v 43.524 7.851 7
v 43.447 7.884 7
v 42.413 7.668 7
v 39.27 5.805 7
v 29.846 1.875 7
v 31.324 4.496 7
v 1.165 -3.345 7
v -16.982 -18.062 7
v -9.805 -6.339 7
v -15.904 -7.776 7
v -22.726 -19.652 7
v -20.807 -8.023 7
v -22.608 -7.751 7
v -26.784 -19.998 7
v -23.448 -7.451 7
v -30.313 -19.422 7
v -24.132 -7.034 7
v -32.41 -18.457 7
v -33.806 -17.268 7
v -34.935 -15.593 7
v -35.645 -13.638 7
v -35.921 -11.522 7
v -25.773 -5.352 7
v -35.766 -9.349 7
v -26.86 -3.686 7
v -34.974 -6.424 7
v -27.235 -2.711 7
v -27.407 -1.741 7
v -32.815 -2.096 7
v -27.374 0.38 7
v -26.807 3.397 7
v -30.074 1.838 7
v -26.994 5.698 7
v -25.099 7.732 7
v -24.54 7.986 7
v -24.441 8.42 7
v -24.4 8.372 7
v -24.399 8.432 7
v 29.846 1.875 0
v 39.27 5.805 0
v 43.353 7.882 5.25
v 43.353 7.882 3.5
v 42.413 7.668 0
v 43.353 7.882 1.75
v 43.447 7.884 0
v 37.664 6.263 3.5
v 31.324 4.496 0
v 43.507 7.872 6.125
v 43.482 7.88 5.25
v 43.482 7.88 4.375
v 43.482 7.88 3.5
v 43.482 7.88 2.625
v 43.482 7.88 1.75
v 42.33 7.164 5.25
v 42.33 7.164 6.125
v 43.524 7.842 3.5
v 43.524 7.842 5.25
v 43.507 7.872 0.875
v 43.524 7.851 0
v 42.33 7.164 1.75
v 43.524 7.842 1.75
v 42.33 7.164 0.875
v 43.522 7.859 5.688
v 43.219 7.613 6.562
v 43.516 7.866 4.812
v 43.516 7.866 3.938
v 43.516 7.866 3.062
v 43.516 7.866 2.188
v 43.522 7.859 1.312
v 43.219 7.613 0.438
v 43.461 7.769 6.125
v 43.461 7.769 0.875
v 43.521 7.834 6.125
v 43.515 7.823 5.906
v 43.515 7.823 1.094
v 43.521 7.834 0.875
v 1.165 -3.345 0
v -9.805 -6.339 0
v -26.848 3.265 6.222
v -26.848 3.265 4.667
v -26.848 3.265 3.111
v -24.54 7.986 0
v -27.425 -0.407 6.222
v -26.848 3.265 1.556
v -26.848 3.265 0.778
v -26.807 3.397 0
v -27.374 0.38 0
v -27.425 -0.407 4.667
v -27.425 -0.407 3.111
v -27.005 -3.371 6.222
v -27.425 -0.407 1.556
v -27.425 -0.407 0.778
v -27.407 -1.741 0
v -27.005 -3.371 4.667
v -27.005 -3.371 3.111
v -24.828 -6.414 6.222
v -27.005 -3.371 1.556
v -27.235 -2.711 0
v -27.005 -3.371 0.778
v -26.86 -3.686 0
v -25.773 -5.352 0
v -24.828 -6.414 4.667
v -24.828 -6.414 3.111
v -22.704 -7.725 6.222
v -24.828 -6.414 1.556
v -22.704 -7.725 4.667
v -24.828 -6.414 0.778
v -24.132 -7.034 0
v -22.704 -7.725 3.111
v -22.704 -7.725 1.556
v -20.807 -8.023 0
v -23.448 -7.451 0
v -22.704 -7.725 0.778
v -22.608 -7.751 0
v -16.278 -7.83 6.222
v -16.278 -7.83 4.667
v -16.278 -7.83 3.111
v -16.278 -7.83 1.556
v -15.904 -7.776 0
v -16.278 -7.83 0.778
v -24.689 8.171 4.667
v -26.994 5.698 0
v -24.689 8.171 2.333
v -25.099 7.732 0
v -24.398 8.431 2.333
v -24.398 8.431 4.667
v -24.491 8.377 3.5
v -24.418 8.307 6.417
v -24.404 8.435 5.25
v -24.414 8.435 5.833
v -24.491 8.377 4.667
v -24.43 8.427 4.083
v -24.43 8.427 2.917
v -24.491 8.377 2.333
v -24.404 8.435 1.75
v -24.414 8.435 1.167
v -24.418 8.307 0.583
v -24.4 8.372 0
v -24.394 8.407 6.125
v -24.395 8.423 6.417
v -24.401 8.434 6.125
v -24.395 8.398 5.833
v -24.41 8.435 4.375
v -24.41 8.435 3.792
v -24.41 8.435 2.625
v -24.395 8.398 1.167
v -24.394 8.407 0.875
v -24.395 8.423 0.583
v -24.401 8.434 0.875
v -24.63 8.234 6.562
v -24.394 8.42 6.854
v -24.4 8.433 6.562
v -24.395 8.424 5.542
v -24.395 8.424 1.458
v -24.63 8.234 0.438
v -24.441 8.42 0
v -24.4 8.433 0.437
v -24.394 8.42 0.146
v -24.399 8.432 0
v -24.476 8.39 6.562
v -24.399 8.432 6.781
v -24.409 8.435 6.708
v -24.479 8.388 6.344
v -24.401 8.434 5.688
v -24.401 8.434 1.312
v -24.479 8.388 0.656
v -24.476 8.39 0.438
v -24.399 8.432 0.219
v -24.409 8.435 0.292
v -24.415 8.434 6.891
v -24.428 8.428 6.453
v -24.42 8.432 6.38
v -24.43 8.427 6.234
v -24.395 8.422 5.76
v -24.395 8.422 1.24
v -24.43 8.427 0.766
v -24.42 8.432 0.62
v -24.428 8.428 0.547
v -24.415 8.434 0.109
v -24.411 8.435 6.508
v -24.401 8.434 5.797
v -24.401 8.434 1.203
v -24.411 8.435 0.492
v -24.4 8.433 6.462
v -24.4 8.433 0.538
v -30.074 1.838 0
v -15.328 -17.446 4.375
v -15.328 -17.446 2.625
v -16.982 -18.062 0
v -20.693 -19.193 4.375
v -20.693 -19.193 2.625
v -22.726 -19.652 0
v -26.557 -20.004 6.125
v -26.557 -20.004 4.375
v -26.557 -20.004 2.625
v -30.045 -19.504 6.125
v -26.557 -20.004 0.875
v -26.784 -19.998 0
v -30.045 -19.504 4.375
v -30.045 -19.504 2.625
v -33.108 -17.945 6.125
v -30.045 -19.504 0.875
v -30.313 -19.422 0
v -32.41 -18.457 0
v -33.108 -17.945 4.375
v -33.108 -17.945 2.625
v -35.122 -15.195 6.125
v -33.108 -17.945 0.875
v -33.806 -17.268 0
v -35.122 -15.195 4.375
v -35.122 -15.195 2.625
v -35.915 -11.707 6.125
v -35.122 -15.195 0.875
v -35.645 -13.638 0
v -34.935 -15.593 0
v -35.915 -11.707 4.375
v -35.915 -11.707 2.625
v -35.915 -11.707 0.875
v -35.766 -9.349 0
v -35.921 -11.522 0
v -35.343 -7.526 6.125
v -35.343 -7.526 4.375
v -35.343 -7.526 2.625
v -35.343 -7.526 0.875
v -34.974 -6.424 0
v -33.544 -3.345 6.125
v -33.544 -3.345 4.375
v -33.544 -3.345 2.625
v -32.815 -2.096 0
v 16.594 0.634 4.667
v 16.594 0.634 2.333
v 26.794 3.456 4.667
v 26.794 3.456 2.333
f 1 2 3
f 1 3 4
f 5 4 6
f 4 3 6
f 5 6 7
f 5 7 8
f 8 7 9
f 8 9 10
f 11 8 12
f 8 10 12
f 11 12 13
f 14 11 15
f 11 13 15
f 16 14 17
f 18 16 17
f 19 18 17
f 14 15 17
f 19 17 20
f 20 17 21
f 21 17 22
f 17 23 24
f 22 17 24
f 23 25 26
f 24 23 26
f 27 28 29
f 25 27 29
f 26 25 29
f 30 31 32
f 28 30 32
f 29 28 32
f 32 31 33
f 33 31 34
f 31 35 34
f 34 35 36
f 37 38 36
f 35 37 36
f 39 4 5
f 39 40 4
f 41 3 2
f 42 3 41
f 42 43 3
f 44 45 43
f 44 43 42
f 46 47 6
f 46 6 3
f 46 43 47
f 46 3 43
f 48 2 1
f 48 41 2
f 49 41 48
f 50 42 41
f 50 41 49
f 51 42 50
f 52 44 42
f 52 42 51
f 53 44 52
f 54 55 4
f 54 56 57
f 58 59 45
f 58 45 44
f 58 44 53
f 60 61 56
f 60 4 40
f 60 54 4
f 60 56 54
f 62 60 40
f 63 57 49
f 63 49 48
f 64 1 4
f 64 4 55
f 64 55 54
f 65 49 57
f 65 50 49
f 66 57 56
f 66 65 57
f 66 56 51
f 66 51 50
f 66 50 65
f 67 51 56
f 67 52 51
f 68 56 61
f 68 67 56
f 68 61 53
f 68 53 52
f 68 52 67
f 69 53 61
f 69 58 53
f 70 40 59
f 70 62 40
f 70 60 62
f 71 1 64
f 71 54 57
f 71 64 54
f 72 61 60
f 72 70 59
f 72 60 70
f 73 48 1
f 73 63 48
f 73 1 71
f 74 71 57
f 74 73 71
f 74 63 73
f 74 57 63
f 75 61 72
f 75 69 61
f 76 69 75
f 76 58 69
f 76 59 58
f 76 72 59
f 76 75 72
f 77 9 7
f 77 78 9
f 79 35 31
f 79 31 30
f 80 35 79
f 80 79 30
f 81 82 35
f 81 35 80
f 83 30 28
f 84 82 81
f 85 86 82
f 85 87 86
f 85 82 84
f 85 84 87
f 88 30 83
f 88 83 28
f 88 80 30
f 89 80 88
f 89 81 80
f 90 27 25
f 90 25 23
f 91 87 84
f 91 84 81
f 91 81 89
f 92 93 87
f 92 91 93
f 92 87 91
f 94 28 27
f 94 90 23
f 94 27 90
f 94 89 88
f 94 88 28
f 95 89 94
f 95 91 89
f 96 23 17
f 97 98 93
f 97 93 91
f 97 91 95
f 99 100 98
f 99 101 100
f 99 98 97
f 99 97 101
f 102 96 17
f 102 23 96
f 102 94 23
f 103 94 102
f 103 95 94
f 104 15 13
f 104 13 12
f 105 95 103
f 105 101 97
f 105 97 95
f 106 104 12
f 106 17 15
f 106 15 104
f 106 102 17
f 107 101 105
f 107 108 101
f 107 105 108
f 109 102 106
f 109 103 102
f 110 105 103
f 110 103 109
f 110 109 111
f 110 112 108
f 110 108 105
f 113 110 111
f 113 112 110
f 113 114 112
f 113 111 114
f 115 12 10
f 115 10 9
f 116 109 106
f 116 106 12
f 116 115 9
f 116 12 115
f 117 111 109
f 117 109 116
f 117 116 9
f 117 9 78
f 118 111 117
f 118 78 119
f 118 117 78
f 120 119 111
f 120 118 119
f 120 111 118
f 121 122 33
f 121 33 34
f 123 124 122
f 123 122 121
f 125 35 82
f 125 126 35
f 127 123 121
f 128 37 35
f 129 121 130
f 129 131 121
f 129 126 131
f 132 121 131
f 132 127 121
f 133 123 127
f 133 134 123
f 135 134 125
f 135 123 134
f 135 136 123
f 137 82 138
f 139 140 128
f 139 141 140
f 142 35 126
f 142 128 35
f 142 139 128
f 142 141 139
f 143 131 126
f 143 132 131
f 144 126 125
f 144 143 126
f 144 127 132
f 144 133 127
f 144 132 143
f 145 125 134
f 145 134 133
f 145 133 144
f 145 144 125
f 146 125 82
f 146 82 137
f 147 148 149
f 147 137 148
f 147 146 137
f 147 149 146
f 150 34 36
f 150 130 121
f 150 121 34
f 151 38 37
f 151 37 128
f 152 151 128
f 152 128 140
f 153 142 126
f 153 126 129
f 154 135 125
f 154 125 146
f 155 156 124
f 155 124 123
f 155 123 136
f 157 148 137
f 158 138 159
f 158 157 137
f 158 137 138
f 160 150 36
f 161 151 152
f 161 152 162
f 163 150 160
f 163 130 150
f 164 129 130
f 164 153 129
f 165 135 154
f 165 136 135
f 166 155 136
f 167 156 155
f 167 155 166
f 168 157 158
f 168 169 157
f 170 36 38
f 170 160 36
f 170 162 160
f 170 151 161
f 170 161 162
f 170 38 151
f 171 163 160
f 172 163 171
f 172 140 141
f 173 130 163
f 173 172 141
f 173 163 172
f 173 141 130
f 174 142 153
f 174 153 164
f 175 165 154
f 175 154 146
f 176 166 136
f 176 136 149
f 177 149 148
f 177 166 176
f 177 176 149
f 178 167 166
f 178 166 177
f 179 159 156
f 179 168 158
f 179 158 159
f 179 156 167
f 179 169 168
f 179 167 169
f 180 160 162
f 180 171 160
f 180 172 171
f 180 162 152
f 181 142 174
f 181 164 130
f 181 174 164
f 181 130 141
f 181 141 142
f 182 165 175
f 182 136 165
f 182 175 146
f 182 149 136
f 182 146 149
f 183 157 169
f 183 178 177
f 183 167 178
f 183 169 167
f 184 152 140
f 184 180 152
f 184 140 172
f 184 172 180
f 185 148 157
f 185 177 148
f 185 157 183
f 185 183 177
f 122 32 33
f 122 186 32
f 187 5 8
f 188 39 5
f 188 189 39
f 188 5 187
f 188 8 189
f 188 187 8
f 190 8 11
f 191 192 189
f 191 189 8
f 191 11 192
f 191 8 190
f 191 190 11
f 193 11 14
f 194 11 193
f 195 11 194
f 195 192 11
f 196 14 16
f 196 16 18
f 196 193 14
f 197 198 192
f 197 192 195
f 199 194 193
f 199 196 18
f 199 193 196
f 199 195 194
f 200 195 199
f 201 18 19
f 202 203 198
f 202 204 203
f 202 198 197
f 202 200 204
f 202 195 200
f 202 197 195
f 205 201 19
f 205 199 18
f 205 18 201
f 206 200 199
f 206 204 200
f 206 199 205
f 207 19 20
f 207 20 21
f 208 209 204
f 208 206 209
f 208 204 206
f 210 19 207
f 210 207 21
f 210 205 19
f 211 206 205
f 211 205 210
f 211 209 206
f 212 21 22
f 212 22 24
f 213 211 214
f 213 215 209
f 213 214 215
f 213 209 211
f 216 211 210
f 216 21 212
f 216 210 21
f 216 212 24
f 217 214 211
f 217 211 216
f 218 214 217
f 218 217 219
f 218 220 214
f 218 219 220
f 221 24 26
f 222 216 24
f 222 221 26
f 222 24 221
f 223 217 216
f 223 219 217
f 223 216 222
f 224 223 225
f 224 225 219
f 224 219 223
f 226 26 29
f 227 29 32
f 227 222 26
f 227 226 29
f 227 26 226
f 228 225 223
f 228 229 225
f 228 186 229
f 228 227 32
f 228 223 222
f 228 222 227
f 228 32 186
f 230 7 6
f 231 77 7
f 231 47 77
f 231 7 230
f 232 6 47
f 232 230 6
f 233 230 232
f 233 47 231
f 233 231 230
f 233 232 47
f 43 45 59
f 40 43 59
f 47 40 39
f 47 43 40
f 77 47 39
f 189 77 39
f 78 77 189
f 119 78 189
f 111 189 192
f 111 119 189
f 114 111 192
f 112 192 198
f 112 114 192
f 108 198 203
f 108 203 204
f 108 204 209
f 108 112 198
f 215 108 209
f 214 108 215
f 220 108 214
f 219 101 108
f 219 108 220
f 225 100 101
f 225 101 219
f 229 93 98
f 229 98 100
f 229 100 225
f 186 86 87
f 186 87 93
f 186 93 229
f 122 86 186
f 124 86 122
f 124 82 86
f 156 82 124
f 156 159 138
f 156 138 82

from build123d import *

# Parameters (mm, degrees)
F1_DEPTH = 7


with BuildPart() as f1:
    # F0 (on Top) → F1 (new body)
    with BuildSketch(Plane.XY):
        with BuildLine():
            add(Edge.make_bspline(
                [(-24.5399442118, 7.9858221547), (-24.881287558, 7.4063630489), (-25.6391011145, 6.1199106522), (-27.0473109199, 3.2964412095), (-27.5264046021, -0.4194481869), (-27.366247024, -3.4340737524), (-24.8624006016, -6.5646634632), (-22.7421111359, -8.1179139399), (-15.8276652271, -8.2175880232), (-7.2515312987, -5.5169695186), (-1.6106799233, -4.0612830315), (1.1645006399, -3.345115812)],
                knots=[0, 0, 0, 0, 0.0767905302, 0.1704820247, 0.2722923582, 0.3636560745, 0.4657956059, 0.5492354102, 0.6831079087, 0.8440957377, 1, 1, 1, 1], degree=3))
            add(Edge.make_bspline(
                [(-26.9939754706, 5.6983039216), (-26.0780812147, 6.681358633), (-24.8507912945, 7.9986429487), (-24.2992644125, 8.5883270318), (-24.4573579835, 8.1925640811), (-24.5399442118, 7.9858221547)],
                knots=[0, 0, 0, 0, 0.5841612292, 0.7827707005, 1, 1, 1, 1], degree=3))
            add(Edge.make_bspline(
                [(29.8455204267, 1.8753216104), (19.3854444544, -2.568447157), (1.3768280776, -10.219072947), (-14.8236830034, -17.4331393662), (-20.5349523375, -19.2496609389), (-26.5330850358, -20.478136543), (-33.8734034621, -18.8431389132), (-36.8983915675, -11.4999952957), (-33.9567302154, -2.8455304384), (-29.4097303562, 2.7339873036), (-26.9939754706, 5.6983039216)],
                knots=[0, 0, 0, 0, 0.2176113285, 0.3746510966, 0.4655910353, 0.5587419795, 0.6590621446, 0.759197529, 0.8720651498, 1, 1, 1, 1], degree=3))
            add(Edge.make_bspline(
                [(31.3241272617, 4.4956945316), (34.6799318984, 5.421655008), (39.9193855866, 6.8673670081), (43.1679568454, 7.9305612599), (44.1864492536, 7.7914559463), (36.6477150599, 4.6814646235), (29.8455204267, 1.8753216104)],
                knots=[0, 0, 0, 0, 0.3389641939, 0.5292284231, 0.5752231327, 1, 1, 1, 1], degree=3))
            add(Edge.make_bspline(
                [(1.1645006399, -3.345115812), (6.4722997511, -2.0136298564), (16.1058202181, 0.4029833078), (26.4940345692, 3.4715266314), (29.9475995962, 4.2038170173), (31.3241272617, 4.4956945316)],
                knots=[0, 0, 0, 0, 0.4246126437, 0.770661155, 1, 1, 1, 1], degree=3))
        make_face()
    extrude(amount=F1_DEPTH)


solid = f1.part
